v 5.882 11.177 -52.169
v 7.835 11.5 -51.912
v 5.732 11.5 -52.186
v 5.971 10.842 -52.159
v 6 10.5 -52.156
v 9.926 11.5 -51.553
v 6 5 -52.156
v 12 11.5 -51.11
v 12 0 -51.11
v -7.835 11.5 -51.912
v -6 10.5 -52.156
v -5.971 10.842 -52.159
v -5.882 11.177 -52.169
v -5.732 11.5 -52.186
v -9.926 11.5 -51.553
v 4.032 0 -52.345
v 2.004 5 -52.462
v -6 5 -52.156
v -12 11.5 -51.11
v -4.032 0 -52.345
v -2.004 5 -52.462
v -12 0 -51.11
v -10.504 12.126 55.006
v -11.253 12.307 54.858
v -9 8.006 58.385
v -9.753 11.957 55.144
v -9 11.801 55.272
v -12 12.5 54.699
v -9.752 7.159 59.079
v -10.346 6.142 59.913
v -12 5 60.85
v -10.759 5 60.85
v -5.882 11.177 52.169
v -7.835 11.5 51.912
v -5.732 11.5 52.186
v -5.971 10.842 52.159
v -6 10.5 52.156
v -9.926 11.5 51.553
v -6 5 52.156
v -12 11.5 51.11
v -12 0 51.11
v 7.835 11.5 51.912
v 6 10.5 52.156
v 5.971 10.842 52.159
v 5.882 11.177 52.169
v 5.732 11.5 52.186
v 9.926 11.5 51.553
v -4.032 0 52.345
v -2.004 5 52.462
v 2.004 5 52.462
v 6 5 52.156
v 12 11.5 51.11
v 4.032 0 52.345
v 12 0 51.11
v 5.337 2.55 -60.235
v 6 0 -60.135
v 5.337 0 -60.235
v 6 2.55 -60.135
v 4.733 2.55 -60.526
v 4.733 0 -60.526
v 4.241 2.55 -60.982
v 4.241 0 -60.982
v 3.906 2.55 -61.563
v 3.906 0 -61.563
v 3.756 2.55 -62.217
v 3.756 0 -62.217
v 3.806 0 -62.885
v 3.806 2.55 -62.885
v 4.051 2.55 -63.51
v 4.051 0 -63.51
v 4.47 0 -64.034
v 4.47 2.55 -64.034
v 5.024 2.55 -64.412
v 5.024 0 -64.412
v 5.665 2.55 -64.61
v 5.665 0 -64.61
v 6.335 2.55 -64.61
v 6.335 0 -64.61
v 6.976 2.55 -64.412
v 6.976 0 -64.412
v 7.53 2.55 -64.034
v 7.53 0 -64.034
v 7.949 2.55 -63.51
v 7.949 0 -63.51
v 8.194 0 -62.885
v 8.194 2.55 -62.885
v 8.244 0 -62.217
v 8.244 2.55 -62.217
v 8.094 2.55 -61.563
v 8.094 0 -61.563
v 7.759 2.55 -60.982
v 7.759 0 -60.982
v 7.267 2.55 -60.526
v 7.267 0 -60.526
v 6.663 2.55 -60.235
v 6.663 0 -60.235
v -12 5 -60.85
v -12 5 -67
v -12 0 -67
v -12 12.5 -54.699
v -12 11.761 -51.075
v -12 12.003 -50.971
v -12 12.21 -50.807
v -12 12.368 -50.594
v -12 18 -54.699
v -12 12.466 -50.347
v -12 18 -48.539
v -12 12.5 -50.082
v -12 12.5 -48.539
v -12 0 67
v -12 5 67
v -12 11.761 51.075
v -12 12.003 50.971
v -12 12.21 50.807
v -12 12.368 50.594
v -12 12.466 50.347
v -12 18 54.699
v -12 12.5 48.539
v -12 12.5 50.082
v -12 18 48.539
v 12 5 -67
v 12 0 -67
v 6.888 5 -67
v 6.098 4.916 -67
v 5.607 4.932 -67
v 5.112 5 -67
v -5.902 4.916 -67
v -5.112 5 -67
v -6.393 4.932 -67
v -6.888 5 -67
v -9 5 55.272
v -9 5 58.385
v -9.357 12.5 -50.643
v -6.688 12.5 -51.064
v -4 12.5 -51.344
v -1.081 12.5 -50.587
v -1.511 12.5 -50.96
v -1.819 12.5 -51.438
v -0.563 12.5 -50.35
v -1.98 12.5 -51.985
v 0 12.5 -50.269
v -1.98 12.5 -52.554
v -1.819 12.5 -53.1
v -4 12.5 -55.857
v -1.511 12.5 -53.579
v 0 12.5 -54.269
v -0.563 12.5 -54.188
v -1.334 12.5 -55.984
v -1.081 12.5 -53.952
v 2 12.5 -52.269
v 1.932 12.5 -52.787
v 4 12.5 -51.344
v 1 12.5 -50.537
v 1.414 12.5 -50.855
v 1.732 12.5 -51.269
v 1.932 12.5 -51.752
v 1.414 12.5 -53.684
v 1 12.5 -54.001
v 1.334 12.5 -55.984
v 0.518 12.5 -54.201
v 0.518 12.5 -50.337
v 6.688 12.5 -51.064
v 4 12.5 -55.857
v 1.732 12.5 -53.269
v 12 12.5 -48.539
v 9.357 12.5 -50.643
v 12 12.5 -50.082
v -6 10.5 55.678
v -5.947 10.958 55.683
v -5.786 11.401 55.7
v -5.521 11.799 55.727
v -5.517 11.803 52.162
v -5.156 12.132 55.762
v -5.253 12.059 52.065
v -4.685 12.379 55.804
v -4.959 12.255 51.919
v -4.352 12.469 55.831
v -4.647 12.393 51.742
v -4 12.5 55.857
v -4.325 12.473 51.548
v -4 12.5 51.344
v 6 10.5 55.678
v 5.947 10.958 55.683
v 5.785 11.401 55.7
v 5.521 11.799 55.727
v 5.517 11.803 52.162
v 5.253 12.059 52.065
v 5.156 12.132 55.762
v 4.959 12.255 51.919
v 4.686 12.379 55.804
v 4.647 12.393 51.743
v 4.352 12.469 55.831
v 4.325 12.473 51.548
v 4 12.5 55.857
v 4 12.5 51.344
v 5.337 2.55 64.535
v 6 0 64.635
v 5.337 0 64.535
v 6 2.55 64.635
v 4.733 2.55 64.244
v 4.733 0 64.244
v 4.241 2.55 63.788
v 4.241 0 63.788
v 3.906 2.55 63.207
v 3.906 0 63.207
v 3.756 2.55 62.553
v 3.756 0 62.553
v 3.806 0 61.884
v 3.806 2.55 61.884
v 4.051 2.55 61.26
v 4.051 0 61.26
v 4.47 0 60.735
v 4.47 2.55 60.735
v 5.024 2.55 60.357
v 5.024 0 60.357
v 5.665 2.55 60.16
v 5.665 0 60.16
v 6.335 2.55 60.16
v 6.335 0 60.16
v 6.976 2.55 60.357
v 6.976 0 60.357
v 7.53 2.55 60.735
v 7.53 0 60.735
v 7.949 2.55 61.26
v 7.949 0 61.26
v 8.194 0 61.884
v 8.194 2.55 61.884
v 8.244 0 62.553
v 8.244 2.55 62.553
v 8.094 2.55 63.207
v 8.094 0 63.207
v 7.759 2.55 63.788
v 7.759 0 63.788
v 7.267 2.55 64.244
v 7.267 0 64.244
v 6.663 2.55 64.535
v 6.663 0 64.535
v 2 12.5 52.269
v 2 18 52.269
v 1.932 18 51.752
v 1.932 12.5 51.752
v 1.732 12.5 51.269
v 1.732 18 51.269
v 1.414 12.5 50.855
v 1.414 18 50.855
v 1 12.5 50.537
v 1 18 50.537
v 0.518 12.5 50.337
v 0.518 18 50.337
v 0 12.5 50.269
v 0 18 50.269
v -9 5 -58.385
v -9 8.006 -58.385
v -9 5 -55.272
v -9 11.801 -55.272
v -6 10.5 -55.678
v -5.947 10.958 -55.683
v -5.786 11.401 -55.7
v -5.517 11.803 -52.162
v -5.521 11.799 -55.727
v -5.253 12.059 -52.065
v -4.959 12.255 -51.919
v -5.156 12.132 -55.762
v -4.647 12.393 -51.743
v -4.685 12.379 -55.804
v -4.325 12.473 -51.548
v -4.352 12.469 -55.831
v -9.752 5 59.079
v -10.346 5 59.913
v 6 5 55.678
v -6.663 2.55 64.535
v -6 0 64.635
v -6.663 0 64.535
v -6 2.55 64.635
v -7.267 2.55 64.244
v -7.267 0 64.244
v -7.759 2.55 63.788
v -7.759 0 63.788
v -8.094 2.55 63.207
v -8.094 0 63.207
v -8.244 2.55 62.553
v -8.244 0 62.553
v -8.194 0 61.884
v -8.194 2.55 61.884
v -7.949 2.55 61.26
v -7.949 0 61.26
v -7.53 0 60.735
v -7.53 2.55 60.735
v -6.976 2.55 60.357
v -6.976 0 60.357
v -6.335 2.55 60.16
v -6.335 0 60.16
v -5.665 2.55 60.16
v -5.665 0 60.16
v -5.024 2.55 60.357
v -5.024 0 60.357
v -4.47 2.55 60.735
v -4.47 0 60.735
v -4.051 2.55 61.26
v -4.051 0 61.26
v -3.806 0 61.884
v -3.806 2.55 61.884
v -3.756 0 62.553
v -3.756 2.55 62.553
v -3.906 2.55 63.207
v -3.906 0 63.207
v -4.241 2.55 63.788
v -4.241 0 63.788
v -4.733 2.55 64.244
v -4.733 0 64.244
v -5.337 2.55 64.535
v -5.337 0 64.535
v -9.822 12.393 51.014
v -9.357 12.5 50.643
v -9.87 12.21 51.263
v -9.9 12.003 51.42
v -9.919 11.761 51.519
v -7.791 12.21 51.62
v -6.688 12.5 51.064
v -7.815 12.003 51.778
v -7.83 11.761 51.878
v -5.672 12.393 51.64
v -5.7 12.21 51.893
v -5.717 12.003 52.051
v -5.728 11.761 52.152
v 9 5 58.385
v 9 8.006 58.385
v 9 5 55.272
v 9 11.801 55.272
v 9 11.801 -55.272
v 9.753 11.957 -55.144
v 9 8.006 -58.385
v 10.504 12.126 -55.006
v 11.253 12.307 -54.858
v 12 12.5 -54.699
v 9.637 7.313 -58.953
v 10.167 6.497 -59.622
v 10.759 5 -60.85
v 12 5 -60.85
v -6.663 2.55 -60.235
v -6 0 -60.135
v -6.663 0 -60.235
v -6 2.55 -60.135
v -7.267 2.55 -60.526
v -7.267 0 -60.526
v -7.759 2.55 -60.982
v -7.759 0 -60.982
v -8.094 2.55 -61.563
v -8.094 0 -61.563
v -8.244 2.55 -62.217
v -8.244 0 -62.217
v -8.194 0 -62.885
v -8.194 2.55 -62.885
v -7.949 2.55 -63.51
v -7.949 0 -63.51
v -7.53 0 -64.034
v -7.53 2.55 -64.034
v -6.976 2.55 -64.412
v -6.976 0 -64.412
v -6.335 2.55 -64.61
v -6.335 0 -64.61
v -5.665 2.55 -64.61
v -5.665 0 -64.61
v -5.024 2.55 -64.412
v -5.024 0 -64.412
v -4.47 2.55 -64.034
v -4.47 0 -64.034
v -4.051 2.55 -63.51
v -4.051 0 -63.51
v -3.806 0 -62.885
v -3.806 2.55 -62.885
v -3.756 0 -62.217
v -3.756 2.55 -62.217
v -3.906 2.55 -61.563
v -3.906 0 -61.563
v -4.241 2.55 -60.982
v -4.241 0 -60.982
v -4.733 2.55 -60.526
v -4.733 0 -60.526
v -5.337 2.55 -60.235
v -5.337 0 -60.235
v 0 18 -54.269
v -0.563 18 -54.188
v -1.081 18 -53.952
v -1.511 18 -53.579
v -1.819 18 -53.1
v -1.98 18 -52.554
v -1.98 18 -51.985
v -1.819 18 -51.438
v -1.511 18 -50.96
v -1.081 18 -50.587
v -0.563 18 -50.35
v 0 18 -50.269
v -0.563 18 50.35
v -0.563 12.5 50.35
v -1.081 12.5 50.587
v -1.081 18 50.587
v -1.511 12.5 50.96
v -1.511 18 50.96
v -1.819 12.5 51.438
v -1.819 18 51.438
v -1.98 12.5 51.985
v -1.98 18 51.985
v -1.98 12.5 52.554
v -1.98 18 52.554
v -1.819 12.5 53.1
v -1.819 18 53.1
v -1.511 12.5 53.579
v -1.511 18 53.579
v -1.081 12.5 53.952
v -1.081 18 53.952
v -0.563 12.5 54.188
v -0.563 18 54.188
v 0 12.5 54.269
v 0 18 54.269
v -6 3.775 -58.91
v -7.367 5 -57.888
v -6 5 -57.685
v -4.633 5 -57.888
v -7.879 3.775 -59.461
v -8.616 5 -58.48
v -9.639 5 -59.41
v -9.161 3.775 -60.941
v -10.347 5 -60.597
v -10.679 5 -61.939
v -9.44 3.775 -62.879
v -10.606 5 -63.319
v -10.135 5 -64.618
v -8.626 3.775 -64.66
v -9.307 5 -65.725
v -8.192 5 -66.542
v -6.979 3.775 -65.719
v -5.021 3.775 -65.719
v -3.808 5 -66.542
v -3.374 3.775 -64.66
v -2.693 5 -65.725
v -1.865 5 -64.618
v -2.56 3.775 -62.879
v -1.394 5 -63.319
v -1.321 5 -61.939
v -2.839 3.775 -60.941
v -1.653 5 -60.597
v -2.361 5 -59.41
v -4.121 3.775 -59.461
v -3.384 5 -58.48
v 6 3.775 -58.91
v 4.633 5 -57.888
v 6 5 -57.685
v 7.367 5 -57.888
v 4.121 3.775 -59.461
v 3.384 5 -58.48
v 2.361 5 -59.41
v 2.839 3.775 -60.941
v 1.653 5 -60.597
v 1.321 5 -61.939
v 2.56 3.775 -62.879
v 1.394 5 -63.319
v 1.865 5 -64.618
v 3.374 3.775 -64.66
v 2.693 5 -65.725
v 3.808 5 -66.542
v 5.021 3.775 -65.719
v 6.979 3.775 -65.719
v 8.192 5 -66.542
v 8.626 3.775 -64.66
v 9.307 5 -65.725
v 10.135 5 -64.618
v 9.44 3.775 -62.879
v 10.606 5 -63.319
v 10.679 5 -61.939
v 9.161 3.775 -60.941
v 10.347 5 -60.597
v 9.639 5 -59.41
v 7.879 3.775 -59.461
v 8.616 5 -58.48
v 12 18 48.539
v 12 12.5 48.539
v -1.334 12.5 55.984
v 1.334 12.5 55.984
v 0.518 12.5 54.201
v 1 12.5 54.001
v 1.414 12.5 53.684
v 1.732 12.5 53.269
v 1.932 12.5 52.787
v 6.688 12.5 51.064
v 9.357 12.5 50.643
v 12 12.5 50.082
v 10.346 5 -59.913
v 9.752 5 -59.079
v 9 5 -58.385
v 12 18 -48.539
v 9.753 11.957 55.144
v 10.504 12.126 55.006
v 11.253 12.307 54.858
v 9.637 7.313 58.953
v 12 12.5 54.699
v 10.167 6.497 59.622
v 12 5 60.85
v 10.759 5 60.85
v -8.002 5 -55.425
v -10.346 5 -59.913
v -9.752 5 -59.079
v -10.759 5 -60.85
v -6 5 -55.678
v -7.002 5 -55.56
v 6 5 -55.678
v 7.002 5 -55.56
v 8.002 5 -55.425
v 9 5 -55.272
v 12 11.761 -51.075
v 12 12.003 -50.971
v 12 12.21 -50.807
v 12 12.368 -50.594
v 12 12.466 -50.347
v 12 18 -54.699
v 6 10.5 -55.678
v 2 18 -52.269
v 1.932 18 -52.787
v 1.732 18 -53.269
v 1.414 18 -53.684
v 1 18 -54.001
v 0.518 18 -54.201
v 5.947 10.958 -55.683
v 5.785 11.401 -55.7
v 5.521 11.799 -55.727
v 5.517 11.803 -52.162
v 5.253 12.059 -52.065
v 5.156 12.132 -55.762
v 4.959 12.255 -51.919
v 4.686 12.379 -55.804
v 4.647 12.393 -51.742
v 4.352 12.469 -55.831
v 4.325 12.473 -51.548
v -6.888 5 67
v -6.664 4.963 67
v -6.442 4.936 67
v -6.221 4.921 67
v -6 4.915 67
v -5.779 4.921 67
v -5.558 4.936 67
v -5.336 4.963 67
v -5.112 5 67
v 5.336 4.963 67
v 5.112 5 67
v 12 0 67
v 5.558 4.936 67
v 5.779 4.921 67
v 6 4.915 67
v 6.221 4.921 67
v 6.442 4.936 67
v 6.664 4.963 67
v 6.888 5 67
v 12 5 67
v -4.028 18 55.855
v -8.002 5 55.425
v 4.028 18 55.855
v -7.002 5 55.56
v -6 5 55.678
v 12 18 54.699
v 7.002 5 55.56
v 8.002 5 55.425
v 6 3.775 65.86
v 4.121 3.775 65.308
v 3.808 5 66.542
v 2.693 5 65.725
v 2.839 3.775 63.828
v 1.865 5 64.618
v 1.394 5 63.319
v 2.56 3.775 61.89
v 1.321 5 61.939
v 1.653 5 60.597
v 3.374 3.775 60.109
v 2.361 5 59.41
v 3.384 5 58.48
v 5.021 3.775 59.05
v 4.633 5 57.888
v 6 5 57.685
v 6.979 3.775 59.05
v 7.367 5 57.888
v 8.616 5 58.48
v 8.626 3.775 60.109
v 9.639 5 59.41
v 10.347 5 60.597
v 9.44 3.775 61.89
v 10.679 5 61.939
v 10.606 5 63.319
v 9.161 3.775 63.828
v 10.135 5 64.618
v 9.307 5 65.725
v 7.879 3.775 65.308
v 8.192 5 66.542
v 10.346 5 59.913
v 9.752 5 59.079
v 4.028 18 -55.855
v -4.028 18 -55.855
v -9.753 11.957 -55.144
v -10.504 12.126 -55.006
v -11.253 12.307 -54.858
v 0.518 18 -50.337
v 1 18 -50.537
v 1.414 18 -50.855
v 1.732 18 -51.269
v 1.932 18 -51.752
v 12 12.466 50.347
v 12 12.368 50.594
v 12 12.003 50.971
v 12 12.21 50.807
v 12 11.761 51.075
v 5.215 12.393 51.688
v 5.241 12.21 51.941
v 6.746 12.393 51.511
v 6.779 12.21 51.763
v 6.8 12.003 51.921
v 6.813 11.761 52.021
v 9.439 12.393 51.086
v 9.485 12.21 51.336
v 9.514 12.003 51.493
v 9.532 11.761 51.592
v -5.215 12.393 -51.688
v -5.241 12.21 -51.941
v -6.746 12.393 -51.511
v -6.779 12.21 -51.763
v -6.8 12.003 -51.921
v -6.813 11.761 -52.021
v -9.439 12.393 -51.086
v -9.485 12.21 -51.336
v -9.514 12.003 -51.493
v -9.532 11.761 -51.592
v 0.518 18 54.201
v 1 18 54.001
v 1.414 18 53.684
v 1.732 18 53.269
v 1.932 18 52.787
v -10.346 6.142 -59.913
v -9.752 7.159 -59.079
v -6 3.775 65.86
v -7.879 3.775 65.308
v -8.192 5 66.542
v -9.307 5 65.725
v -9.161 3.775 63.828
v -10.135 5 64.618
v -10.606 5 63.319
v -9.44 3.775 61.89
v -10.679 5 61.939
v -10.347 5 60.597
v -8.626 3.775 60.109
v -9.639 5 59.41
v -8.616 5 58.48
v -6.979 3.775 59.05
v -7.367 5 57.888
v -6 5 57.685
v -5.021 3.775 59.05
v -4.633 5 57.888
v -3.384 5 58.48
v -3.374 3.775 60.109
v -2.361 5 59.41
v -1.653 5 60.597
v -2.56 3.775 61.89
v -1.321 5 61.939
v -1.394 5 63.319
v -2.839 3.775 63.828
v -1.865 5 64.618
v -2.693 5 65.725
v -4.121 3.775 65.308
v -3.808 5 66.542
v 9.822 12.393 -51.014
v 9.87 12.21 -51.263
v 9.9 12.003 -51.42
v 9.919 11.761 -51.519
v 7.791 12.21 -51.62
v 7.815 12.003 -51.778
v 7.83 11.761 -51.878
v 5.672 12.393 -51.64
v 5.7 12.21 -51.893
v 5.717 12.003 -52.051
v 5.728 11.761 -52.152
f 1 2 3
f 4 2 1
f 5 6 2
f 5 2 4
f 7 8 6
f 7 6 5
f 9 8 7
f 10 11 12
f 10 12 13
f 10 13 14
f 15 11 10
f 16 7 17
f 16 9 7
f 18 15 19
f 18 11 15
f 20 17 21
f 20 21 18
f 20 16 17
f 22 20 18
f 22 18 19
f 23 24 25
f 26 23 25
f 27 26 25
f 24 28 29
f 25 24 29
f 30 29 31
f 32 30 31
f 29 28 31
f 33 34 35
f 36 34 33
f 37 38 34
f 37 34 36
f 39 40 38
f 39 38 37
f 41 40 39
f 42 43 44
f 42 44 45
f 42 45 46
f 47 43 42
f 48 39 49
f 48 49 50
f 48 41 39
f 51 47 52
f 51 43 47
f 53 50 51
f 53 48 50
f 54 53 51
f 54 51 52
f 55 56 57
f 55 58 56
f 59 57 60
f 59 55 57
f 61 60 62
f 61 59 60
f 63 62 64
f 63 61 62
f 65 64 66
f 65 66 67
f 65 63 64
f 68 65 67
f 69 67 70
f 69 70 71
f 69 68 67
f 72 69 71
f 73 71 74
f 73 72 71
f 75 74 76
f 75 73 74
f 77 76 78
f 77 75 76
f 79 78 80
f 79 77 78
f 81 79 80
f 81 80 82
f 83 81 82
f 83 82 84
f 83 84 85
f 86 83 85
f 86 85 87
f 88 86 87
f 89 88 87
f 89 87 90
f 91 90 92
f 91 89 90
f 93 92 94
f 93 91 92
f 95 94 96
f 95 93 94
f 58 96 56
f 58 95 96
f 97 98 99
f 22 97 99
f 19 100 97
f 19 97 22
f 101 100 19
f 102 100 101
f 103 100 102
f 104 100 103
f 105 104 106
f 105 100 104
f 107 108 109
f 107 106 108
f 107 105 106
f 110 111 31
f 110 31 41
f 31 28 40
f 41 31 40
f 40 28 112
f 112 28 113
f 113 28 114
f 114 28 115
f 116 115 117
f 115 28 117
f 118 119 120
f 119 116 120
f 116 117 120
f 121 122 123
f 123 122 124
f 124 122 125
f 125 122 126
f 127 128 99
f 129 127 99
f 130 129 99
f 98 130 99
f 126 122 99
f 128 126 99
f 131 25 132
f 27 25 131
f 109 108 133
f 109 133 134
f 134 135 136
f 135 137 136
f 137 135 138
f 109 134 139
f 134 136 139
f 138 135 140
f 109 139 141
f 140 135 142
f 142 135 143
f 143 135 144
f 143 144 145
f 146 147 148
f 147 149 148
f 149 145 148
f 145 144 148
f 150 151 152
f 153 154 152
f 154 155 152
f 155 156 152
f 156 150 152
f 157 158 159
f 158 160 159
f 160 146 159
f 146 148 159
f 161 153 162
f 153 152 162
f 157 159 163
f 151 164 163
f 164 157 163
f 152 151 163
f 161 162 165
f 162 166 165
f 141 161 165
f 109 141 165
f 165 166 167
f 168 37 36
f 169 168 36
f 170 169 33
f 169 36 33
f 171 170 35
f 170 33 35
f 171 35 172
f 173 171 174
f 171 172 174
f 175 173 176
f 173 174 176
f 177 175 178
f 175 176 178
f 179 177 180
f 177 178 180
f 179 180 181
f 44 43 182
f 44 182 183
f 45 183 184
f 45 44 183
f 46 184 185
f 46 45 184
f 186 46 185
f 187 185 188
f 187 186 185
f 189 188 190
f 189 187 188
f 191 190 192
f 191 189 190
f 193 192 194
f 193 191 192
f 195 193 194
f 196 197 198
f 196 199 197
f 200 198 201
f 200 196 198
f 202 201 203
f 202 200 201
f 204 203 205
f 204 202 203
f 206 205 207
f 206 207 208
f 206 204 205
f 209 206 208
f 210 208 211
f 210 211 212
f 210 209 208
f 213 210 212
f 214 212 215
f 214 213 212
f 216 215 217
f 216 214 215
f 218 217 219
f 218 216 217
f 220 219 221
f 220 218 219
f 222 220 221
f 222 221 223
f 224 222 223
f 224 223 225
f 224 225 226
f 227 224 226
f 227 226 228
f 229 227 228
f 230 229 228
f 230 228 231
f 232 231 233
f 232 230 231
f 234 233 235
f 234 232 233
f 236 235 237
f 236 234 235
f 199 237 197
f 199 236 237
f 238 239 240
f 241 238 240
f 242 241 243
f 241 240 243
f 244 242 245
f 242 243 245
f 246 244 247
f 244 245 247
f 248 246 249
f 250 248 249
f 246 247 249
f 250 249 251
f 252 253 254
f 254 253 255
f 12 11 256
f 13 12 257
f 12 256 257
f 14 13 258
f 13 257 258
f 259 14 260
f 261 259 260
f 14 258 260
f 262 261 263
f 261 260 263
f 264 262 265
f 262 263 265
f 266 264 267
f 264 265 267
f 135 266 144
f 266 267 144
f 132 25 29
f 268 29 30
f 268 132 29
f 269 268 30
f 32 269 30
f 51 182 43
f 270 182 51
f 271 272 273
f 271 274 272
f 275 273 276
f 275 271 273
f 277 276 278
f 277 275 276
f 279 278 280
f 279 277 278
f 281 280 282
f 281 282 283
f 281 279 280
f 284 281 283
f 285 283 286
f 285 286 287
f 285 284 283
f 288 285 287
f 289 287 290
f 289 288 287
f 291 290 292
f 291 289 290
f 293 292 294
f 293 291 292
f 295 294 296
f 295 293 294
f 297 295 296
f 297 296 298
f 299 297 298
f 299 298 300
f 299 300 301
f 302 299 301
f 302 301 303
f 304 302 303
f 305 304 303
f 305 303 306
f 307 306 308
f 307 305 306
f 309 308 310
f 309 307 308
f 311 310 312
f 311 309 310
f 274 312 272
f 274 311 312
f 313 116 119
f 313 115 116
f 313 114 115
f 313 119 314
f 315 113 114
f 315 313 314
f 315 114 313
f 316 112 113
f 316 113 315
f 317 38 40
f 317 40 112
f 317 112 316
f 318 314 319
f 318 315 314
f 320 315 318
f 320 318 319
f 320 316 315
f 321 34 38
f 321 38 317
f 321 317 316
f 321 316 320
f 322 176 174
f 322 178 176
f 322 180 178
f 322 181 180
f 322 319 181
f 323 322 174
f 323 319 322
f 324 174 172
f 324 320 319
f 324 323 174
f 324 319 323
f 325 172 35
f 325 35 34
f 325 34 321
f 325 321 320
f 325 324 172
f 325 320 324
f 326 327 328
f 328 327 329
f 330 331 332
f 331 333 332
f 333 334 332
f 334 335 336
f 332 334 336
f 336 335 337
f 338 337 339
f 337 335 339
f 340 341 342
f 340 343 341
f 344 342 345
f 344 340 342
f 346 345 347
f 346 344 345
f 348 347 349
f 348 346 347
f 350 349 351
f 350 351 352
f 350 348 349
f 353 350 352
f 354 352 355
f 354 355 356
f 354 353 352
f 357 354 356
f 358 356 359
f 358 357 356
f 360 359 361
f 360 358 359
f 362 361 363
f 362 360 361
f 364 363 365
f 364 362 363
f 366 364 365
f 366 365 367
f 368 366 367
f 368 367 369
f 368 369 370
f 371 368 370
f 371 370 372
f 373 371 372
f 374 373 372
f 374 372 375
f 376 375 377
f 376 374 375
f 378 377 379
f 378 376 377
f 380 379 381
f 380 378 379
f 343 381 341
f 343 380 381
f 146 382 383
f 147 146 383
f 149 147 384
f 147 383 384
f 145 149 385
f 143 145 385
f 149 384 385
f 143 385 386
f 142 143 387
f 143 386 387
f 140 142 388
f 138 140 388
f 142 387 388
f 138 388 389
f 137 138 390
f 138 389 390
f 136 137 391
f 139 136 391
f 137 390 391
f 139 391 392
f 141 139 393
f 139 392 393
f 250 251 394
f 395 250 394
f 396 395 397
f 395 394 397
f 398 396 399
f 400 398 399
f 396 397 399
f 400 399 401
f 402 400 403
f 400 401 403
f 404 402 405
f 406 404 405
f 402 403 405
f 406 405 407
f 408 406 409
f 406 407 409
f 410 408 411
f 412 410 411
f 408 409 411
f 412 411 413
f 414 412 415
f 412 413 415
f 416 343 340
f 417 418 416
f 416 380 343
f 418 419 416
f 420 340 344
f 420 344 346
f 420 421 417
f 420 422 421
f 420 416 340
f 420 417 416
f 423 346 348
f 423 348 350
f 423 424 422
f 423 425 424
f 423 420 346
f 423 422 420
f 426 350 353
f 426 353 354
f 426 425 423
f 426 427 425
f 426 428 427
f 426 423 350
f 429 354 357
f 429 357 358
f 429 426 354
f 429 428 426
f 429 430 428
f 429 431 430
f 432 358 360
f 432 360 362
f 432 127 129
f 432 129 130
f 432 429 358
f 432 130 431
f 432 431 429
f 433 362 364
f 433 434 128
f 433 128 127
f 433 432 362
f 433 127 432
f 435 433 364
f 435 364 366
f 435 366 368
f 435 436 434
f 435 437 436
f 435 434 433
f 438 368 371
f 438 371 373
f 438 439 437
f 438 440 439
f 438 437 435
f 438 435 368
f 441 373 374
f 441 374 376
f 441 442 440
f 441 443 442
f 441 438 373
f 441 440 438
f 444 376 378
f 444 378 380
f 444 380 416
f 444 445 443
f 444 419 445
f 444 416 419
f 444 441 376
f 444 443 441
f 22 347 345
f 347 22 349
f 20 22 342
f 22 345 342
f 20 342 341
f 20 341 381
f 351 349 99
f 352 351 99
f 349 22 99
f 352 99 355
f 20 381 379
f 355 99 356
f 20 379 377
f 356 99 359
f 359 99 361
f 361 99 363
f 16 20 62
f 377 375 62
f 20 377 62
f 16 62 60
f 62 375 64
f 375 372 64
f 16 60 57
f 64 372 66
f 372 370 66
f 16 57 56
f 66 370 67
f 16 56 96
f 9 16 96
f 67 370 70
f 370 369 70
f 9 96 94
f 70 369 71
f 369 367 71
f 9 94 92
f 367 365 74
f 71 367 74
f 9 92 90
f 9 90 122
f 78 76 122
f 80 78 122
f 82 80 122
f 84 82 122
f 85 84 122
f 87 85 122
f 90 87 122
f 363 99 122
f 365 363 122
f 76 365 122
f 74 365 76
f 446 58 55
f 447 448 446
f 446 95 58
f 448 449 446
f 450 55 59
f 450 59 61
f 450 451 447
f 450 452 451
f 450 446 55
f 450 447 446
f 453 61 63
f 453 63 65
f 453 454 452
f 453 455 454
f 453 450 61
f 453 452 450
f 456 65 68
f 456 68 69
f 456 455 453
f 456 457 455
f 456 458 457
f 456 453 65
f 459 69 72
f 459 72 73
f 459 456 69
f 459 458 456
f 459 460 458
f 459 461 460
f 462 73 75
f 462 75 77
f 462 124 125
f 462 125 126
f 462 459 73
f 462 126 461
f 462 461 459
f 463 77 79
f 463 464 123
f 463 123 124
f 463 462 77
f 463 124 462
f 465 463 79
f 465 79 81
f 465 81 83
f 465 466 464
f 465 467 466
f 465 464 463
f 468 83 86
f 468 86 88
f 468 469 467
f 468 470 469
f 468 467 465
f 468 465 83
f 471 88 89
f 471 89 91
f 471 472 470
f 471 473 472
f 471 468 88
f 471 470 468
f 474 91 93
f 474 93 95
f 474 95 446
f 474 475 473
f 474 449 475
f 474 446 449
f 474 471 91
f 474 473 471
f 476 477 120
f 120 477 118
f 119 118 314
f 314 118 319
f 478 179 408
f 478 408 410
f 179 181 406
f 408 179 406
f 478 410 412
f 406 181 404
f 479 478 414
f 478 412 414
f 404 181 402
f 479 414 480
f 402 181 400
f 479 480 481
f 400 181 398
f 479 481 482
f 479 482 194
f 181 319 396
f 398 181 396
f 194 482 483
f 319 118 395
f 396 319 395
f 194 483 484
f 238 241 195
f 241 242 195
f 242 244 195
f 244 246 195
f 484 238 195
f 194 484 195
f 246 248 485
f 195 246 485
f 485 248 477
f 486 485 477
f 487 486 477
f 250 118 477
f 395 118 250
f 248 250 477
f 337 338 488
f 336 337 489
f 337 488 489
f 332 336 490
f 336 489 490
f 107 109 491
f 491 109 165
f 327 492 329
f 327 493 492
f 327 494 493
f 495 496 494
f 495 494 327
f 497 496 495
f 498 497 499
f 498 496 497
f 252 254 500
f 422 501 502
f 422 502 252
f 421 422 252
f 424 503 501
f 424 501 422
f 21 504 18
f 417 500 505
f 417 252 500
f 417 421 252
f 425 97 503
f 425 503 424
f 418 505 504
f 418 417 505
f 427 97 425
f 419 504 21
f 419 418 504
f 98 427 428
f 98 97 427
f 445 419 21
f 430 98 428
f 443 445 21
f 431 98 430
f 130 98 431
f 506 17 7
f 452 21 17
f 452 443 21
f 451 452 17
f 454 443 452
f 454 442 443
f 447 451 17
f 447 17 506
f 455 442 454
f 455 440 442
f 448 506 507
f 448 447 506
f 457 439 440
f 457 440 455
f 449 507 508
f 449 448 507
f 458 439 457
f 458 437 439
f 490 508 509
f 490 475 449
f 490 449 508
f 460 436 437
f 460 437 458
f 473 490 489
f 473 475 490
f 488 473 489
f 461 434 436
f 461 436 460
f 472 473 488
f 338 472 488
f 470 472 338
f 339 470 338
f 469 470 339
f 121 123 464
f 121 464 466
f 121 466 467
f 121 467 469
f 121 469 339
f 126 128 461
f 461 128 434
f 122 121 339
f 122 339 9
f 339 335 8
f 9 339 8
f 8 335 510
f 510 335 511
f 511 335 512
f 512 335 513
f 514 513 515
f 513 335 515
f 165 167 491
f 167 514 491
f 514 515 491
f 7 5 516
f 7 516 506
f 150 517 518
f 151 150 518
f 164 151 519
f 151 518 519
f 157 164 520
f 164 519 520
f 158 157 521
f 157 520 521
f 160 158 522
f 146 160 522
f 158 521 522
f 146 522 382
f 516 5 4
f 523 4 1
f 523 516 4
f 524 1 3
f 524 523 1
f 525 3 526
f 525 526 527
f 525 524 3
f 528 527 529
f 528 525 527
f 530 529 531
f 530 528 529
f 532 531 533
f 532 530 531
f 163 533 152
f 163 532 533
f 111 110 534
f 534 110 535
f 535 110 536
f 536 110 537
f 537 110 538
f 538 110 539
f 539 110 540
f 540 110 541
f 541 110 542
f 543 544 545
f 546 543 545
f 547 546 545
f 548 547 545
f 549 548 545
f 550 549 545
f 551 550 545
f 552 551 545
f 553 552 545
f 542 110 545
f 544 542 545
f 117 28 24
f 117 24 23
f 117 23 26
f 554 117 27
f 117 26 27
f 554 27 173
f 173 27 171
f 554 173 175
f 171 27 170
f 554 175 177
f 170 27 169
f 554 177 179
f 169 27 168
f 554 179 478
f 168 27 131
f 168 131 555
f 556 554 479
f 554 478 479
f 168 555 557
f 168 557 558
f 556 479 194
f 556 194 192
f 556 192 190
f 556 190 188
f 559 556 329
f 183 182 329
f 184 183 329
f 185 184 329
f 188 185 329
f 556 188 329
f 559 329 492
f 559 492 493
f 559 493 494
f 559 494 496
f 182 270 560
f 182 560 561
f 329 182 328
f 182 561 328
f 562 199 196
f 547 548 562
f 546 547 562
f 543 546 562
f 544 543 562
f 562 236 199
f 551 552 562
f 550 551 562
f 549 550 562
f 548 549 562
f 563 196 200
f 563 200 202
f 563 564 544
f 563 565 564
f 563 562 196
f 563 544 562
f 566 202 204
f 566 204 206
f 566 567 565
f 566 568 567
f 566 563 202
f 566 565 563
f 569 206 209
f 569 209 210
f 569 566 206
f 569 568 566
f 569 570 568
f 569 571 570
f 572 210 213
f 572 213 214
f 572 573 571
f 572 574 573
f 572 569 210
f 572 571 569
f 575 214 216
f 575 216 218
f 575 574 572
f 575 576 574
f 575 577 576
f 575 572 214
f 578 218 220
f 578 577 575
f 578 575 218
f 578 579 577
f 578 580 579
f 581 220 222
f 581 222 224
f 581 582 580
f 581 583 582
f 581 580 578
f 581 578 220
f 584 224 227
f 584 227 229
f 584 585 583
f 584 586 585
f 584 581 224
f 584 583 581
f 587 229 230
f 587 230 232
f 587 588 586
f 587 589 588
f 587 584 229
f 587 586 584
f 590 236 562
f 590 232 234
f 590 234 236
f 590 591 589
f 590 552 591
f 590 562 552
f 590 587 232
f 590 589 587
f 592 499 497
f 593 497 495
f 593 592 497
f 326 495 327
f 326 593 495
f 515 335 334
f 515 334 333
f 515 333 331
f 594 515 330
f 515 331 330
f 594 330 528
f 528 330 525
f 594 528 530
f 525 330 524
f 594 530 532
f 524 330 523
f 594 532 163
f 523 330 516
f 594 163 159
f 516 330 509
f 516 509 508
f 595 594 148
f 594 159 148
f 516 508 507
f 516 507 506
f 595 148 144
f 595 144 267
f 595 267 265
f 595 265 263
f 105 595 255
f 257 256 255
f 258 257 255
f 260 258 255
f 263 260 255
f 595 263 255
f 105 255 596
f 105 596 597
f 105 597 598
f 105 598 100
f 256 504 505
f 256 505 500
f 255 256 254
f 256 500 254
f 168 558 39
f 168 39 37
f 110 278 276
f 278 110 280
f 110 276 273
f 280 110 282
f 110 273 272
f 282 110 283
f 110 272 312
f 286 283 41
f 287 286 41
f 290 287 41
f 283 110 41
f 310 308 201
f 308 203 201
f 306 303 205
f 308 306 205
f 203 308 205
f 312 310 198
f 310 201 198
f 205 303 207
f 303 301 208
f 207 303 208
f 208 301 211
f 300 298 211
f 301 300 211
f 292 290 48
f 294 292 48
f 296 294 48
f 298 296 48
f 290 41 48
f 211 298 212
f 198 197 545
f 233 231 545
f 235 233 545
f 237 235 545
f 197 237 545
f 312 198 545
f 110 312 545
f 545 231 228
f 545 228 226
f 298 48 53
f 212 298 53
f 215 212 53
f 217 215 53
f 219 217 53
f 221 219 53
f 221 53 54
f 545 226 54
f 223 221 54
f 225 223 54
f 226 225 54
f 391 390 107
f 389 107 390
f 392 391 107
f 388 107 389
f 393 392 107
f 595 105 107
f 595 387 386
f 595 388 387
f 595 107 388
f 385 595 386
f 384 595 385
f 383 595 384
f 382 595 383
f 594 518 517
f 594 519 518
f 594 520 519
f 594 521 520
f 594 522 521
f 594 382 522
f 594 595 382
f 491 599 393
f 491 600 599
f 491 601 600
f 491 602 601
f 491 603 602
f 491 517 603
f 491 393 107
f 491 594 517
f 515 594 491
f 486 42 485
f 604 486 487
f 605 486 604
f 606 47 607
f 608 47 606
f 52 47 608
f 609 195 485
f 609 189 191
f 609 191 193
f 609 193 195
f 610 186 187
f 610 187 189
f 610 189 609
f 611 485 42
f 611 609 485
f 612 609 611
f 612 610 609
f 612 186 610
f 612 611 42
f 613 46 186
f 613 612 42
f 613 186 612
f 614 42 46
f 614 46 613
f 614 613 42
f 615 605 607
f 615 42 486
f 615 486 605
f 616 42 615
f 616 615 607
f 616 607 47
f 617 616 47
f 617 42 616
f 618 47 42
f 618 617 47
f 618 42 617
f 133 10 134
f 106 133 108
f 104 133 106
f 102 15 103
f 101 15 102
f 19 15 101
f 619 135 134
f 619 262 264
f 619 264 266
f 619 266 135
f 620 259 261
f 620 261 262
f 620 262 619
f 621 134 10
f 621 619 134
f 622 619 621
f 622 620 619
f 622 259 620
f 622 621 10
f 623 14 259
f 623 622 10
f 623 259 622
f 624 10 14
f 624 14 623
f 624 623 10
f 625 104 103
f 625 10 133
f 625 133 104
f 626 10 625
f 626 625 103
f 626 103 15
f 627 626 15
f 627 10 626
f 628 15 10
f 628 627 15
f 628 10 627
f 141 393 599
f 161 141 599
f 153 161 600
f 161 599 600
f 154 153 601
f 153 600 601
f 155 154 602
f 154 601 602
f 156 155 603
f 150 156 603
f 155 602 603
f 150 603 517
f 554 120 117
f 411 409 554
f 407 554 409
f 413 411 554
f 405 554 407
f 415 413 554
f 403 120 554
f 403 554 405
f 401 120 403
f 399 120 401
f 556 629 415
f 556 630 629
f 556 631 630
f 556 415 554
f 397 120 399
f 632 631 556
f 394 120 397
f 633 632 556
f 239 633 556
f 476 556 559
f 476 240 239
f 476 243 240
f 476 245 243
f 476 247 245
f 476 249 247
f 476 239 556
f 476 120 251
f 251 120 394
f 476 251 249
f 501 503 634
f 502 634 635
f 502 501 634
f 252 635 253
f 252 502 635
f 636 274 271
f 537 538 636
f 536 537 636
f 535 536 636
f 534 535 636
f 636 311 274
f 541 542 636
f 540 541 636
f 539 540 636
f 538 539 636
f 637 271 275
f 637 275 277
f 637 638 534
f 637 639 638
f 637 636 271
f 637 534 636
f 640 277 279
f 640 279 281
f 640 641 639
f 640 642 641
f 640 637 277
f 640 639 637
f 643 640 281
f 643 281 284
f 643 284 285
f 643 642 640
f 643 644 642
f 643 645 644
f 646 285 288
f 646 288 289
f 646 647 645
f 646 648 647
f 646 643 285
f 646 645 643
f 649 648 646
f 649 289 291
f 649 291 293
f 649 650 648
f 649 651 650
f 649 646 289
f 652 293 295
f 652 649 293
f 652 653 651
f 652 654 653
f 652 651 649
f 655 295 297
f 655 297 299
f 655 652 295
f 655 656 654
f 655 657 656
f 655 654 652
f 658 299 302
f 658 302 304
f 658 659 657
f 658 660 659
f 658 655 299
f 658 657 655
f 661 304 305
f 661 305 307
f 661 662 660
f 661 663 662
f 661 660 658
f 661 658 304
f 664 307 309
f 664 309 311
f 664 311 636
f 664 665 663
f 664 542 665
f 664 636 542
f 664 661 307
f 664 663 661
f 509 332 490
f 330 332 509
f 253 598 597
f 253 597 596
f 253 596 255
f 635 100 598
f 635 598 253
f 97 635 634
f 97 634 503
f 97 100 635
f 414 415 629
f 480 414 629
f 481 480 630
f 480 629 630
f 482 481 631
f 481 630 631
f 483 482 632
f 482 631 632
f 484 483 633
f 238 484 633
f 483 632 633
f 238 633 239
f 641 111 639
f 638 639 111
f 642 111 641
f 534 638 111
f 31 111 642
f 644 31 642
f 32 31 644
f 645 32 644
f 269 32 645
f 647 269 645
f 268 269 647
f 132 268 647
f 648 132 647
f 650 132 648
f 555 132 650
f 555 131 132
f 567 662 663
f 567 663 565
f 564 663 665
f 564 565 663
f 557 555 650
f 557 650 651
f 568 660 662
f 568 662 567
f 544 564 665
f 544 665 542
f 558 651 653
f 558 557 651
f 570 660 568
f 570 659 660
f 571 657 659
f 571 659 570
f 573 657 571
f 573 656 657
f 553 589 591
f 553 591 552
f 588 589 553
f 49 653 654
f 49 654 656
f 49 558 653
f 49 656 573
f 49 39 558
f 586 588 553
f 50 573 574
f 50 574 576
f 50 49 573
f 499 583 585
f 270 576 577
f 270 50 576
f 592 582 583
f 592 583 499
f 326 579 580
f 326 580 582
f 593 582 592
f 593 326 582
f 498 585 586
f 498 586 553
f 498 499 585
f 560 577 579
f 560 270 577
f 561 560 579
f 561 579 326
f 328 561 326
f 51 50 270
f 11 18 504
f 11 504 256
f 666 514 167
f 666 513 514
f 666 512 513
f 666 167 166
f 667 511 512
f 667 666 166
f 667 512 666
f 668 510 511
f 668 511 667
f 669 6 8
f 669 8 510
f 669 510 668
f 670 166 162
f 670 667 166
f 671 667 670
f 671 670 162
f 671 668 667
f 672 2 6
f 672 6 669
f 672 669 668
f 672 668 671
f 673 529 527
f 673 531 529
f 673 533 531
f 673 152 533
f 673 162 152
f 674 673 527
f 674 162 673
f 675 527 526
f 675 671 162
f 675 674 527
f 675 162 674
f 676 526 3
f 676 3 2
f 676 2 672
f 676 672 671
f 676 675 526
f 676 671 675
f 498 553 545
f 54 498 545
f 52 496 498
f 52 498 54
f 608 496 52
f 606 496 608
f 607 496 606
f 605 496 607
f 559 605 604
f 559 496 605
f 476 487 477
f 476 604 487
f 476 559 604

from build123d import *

# Parameters (mm, degrees)
BOSS_EXTRUDE2_DEPTH                            = 5
BOSS_EXTRUDE2_2_DEPTH                          = 5
CSK_FOR_M4_FLAT_HEAD_MACHINE_SCREW3_AT_2_COUNT = 2
CSK_FOR_M4_FLAT_HEAD_MACHINE_SCREW3_AT_2_PITCH = 12
CSK_FOR_M4_FLAT_HEAD_MACHINE_SCREW5_AT_2_COUNT = 2
CSK_FOR_M4_FLAT_HEAD_MACHINE_SCREW5_AT_2_PITCH = 12
BOSS_EXTRUDE3_DEPTH                            = 13
BOSS_EXTRUDE3_DEPTH_BACK                       = 5
BOSS_EXTRUDE3_2_DEPTH                          = 13
BOSS_EXTRUDE3_2_DEPTH_BACK                     = 5
BOSS_EXTRUDE4_DEPTH                            = 3
BOSS_EXTRUDE5_DEPTH                            = 3
CUT_EXTRUDE5_DEPTH                             = 12.5
CUT_EXTRUDE5_DEPTH_BACK                        = 71.405965656
SKETCH28_R                                     = 52.5
FILLET5_R                                      = 1
FILLET6_R                                      = 1
SKETCH30_R                                     = 5
CUT_EXTRUDE10_DEPTH                            = 13
MIRROR4_START                                  = 5
MIRROR4_DEPTH                                  = 3.005808181
CUT_EXTRUDE11_DEPTH                            = 118.546494541
CUT_EXTRUDE11_DEPTH_BACK                       = 13
CUT_EXTRUDE12_DEPTH                            = 13
SKETCH32_R                                     = 5
CUT_EXTRUDE13_DEPTH                            = 12
FILLET7_R                                      = 2
FILLET8_R                                      = 2


# Read off the part's stored shape, not the designer's step: Mirror4
with BuildPart() as part:
    # Sketch2 → Boss-Extrude2 (new body)
    with BuildSketch(Plane(origin=(0, 0, 0), x_dir=(1, 0, 0), z_dir=(0, 1, 0))):
        with BuildLine():
            Line((-12, -67), (12, -67))
            Line((12, -67), (12, -54.699177325))
            ThreePointArc((12, -54.699177325), (0, -56), (-12, -54.699177325))
            Line((-12, -54.699177325), (-12, -67))
        make_face()
    extrude(amount=BOSS_EXTRUDE2_DEPTH)

    # Sketch9 → CSK for M4 Flat Head Machine Screw5 (revolve, cut)
    with BuildSketch(Plane(origin=(-6, 5, 62.3846611), x_dir=(0, 0, 1), z_dir=(1, 0, 0))):
        Polygon((0, 0), (0, 5), (2.25, 5), (2.25, 2.45), (4.7, 0), align=None)
    csk_for_m4_flat_head_machine_screw5 = revolve(axis=Axis((-6, 11.35, 62.3846611), (0, -1, 0)), mode=Mode.SUBTRACT)

    # CSK for M4 Flat Head Machine Screw5 at 2: CSK for M4 Flat Head Machine Screw5 ×2
    with Locations(*[(i * CSK_FOR_M4_FLAT_HEAD_MACHINE_SCREW5_AT_2_PITCH, 0, 0) for i in range(1, CSK_FOR_M4_FLAT_HEAD_MACHINE_SCREW5_AT_2_COUNT)]):
        add(csk_for_m4_flat_head_machine_screw5, mode=Mode.SUBTRACT)



with BuildPart() as body_2:
    # Sketch2 → Boss-Extrude2 2 (new body)
    with BuildSketch(Plane(origin=(0, 0, 0), x_dir=(1, 0, 0), z_dir=(0, 1, 0))):
        with BuildLine():
            Line((-12, 67), (-12, 54.699177325))
            ThreePointArc((-12, 54.699177325), (0, 56), (12, 54.699177325))
            Line((12, 54.699177325), (12, 67))
            Line((12, 67), (-12, 67))
        make_face()
    extrude(amount=BOSS_EXTRUDE2_2_DEPTH)

    # Sketch6 → CSK for M4 Flat Head Machine Screw3 (revolve, cut)
    with BuildSketch(Plane(origin=(6, 5, -62.3846611), x_dir=(0, 0, 1), z_dir=(1, 0, 0))):
        Polygon((0, 0), (0, 5), (2.25, 5), (2.25, 2.45), (4.7, 0), align=None)
    csk_for_m4_flat_head_machine_screw3 = revolve(axis=Axis((6, 11.35, -62.3846611), (0, -1, 0)), mode=Mode.SUBTRACT)

    # CSK for M4 Flat Head Machine Screw3 at 2: CSK for M4 Flat Head Machine Screw3 ×2
    with Locations(*[(-i * CSK_FOR_M4_FLAT_HEAD_MACHINE_SCREW3_AT_2_PITCH, 0, 0) for i in range(1, CSK_FOR_M4_FLAT_HEAD_MACHINE_SCREW3_AT_2_COUNT)]):
        add(csk_for_m4_flat_head_machine_screw3, mode=Mode.SUBTRACT)



with BuildPart() as body_3:
    # Sketch10 → Boss-Extrude3 (new, two sides: drawn at the far end of the back side and taken through both)
    with BuildSketch(Plane(origin=(0, 5, 0), x_dir=(1, 0, 0), z_dir=(0, 1, 0)).offset(-BOSS_EXTRUDE3_DEPTH_BACK)):
        with BuildLine():
            Line((-12, -48.5386444), (-12, -54.699177325))
            ThreePointArc((-12, -54.699177325), (0, -56), (12, -54.699177325))
            Line((12, -54.699177325), (12, -48.5386444))
            Line((12, -48.5386444), (-12, -48.5386444))
        make_face()
    extrude(amount=BOSS_EXTRUDE3_DEPTH + BOSS_EXTRUDE3_DEPTH_BACK)


with BuildPart() as body_4:
    # Sketch10 → Boss-Extrude3 2 (new, two sides: drawn at the far end of the back side and taken through both)
    with BuildSketch(Plane(origin=(0, 5, 0), x_dir=(1, 0, 0), z_dir=(0, 1, 0)).offset(-BOSS_EXTRUDE3_2_DEPTH_BACK)):
        with BuildLine():
            ThreePointArc((12, 54.699177325), (0, 56), (-12, 54.699177325))
            Line((-12, 54.699177325), (-12, 48.5386444))
            Line((-12, 48.5386444), (12, 48.5386444))
            Line((12, 48.5386444), (12, 54.699177325))
        make_face()
    extrude(amount=BOSS_EXTRUDE3_2_DEPTH + BOSS_EXTRUDE3_2_DEPTH_BACK)


with BuildPart() as part_1:
    add(part.part)

    add(body_3.part)  # Boss-Extrude4 merges body 3
    # Sketch21 → Boss-Extrude4 (add)
    with BuildSketch(Plane(origin=(12, 0, 0), x_dir=(0, 0, -1), z_dir=(1, 0, 0))):
        Polygon((-54.699177325, 5), (-54.699177325, 12.5), (-60.849588662, 5), align=None)
    boss_extrude4 = extrude(amount=-BOSS_EXTRUDE4_DEPTH)

    # Mirror1: Boss-Extrude4 across plane
    add(boss_extrude4.mirror(Plane(origin=(0, 0, 0), x_dir=(0, 0, 1), z_dir=(1, 0, 0))))


with BuildPart() as body_2_1:
    add(body_2.part)

    add(body_4.part)  # Boss-Extrude5 merges body 4
    # Sketch22 → Boss-Extrude5 (add)
    with BuildSketch(Plane(origin=(12, 0, 0), x_dir=(0, 0, -1), z_dir=(1, 0, 0))):
        Polygon((54.699177325, 12.5), (60.849588662, 5), (54.699177325, 5), align=None)
    boss_extrude5 = extrude(amount=-BOSS_EXTRUDE5_DEPTH)

    # Mirror2: Boss-Extrude5 across plane
    add(boss_extrude5.mirror(Plane(origin=(0, 0, 0), x_dir=(0, 0, 1), z_dir=(1, 0, 0))))


with BuildPart() as cut_extrude5_tool:
    # Sketch28 → Cut-Extrude5 (new, two sides: drawn at the far end of the back side and taken through both)
    with BuildSketch(Plane(origin=(0, 0, 0), x_dir=(1, 0, 0), z_dir=(0, 1, 0)).offset(-CUT_EXTRUDE5_DEPTH_BACK)):
        Circle(SKETCH28_R)
    extrude(amount=CUT_EXTRUDE5_DEPTH + CUT_EXTRUDE5_DEPTH_BACK)


with BuildPart() as part_2:
    add(part_1.part)

    # Cut-Extrude5: cut by cut_extrude5_tool
    add(cut_extrude5_tool.part, mode=Mode.SUBTRACT)

    # Fillet6
    fillet6_edges = [part_2.edges().sort_by_distance(p)[0] for p in [
        (0, 12.5, 52.5),
    ]]
    fillet(fillet6_edges, radius=FILLET6_R)

    # Sketch30 → Cut-Extrude10 (cut)
    with BuildSketch(Plane(origin=(0, 5, 0), x_dir=(1, 0, 0), z_dir=(0, 1, 0))):
        with Locations((-6, -62.3846611)):
            Circle(SKETCH30_R)
    extrude(amount=CUT_EXTRUDE10_DEPTH, mode=Mode.SUBTRACT)

    # Mirror4 outline → Mirror4 (cut)
    with BuildSketch(Plane(origin=(0, 0, 0), x_dir=(1, 0, 0), z_dir=(0, 1, 0)).offset(MIRROR4_START)):
        with BuildLine():
            ThreePointArc((10.758524205, -60.849588662), (10.070336771, -59.480808733), (9, -58.3846611))
            Line((9, -58.3846611), (9, -62))
            Line((9, -62), (11.129640262, -62))
            Line((11.129640262, -62), (10.758524205, -60.849588662))
        make_face()
    extrude(amount=MIRROR4_DEPTH, mode=Mode.SUBTRACT)


with BuildPart() as body_2_2:
    add(body_2_1.part)

    # Cut-Extrude5: cut by cut_extrude5_tool
    add(cut_extrude5_tool.part, mode=Mode.SUBTRACT)

    # Fillet5
    fillet5_edges = [body_2_2.edges().sort_by_distance(p)[0] for p in [
        (0, 12.5, -52.5),
    ]]
    fillet(fillet5_edges, radius=FILLET5_R)


with BuildPart() as cut_extrude11_tool:
    # Sketch31 → Cut-Extrude11 (new, two sides: drawn at the far end of the back side and taken through both)
    with BuildSketch(Plane(origin=(0, 0, 48.5386444), x_dir=(-1, 0, 0), z_dir=(0, 0, -1)).offset(-CUT_EXTRUDE11_DEPTH_BACK)):
        Polygon((0, 5), (0, 8.75), (0, 12.5), (-6, 12.5), (-6, 5), align=None)
        Polygon((0, 12.5), (0, 8.75), (0, 5), (6, 5), (6, 12.5), align=None)
    extrude(amount=CUT_EXTRUDE11_DEPTH + CUT_EXTRUDE11_DEPTH_BACK)


with BuildPart() as part_3:
    add(part_2.part)

    # Cut-Extrude11: cut by cut_extrude11_tool
    add(cut_extrude11_tool.part, mode=Mode.SUBTRACT)


with BuildPart() as body_2_3:
    add(body_2_2.part)

    # Cut-Extrude11: cut by cut_extrude11_tool
    add(cut_extrude11_tool.part, mode=Mode.SUBTRACT)


with BuildPart() as cut_extrude12_tool:
    # Sketch14 → Cut-Extrude12 (new body)
    with BuildSketch(Plane(origin=(0, 18, 0), x_dir=(1, 0, 0), z_dir=(0, 1, 0))):
        with BuildLine():
            ThreePointArc((2, 52.2693222), (1.414213562, 53.683535762), (0, 54.2693222))
            Line((0, 54.2693222), (0, 50.2693222))
            ThreePointArc((0, 50.2693222), (1.414213562, 50.855108638), (2, 52.2693222))
        make_face()
        with BuildLine():
            Line((0, 50.2693222), (0, 54.2693222))
            ThreePointArc((0, 54.2693222), (-2, 52.2693222), (0, 50.2693222))
        make_face()
        with BuildLine():
            ThreePointArc((0, -50.2693222), (-2, -52.2693222), (0, -54.2693222))
            Line((0, -54.2693222), (0, -50.2693222))
        make_face()
        with BuildLine():
            Line((0, -50.2693222), (0, -54.2693222))
            ThreePointArc((0, -54.2693222), (1.414213562, -53.683535762), (2, -52.2693222))
            ThreePointArc((2, -52.2693222), (1.414213562, -50.855108638), (0, -50.2693222))
        make_face()
    extrude(amount=-CUT_EXTRUDE12_DEPTH)


with BuildPart() as part_4:
    add(part_3.part)

    # Cut-Extrude12: cut by cut_extrude12_tool
    add(cut_extrude12_tool.part, mode=Mode.SUBTRACT)

    # Fillet7
    fillet7_edges = [part_4.edges().sort_by_distance(p)[0] for p in [
        (6, 12.5, 53.413467462),
        (-6, 12.5, 53.413467462),
    ]]
    fillet(fillet7_edges, radius=FILLET7_R - 0.0004)  # a hair under: the kernel refuses the full size


with BuildPart() as body_2_4:
    add(body_2_3.part)

    # Cut-Extrude12: cut by cut_extrude12_tool
    add(cut_extrude12_tool.part, mode=Mode.SUBTRACT)

    # Sketch32 → Cut-Extrude13 (cut)
    with BuildSketch(Plane(origin=(0, 5, 0), x_dir=(1, 0, 0), z_dir=(0, 1, 0))):
        with Locations((-6, 62.3846611)):
            Circle(SKETCH32_R)
    cut_extrude13 = extrude(amount=CUT_EXTRUDE13_DEPTH, mode=Mode.SUBTRACT)

    # Mirror5: Cut-Extrude13 across plane
    add(cut_extrude13.mirror(Plane(origin=(0, 0, 0), x_dir=(0, 0, 1), z_dir=(1, 0, 0))), mode=Mode.SUBTRACT)

    # Fillet8
    fillet8_edges = [body_2_4.edges().sort_by_distance(p)[0] for p in [
        (6, 12.5, -53.413467462),
        (-6, 12.5, -53.413467462),
    ]]
    fillet(fillet8_edges, radius=FILLET8_R - 0.0004)  # a hair under: the kernel refuses the full size


solid = Compound([part_4.part, body_2_4.part])
